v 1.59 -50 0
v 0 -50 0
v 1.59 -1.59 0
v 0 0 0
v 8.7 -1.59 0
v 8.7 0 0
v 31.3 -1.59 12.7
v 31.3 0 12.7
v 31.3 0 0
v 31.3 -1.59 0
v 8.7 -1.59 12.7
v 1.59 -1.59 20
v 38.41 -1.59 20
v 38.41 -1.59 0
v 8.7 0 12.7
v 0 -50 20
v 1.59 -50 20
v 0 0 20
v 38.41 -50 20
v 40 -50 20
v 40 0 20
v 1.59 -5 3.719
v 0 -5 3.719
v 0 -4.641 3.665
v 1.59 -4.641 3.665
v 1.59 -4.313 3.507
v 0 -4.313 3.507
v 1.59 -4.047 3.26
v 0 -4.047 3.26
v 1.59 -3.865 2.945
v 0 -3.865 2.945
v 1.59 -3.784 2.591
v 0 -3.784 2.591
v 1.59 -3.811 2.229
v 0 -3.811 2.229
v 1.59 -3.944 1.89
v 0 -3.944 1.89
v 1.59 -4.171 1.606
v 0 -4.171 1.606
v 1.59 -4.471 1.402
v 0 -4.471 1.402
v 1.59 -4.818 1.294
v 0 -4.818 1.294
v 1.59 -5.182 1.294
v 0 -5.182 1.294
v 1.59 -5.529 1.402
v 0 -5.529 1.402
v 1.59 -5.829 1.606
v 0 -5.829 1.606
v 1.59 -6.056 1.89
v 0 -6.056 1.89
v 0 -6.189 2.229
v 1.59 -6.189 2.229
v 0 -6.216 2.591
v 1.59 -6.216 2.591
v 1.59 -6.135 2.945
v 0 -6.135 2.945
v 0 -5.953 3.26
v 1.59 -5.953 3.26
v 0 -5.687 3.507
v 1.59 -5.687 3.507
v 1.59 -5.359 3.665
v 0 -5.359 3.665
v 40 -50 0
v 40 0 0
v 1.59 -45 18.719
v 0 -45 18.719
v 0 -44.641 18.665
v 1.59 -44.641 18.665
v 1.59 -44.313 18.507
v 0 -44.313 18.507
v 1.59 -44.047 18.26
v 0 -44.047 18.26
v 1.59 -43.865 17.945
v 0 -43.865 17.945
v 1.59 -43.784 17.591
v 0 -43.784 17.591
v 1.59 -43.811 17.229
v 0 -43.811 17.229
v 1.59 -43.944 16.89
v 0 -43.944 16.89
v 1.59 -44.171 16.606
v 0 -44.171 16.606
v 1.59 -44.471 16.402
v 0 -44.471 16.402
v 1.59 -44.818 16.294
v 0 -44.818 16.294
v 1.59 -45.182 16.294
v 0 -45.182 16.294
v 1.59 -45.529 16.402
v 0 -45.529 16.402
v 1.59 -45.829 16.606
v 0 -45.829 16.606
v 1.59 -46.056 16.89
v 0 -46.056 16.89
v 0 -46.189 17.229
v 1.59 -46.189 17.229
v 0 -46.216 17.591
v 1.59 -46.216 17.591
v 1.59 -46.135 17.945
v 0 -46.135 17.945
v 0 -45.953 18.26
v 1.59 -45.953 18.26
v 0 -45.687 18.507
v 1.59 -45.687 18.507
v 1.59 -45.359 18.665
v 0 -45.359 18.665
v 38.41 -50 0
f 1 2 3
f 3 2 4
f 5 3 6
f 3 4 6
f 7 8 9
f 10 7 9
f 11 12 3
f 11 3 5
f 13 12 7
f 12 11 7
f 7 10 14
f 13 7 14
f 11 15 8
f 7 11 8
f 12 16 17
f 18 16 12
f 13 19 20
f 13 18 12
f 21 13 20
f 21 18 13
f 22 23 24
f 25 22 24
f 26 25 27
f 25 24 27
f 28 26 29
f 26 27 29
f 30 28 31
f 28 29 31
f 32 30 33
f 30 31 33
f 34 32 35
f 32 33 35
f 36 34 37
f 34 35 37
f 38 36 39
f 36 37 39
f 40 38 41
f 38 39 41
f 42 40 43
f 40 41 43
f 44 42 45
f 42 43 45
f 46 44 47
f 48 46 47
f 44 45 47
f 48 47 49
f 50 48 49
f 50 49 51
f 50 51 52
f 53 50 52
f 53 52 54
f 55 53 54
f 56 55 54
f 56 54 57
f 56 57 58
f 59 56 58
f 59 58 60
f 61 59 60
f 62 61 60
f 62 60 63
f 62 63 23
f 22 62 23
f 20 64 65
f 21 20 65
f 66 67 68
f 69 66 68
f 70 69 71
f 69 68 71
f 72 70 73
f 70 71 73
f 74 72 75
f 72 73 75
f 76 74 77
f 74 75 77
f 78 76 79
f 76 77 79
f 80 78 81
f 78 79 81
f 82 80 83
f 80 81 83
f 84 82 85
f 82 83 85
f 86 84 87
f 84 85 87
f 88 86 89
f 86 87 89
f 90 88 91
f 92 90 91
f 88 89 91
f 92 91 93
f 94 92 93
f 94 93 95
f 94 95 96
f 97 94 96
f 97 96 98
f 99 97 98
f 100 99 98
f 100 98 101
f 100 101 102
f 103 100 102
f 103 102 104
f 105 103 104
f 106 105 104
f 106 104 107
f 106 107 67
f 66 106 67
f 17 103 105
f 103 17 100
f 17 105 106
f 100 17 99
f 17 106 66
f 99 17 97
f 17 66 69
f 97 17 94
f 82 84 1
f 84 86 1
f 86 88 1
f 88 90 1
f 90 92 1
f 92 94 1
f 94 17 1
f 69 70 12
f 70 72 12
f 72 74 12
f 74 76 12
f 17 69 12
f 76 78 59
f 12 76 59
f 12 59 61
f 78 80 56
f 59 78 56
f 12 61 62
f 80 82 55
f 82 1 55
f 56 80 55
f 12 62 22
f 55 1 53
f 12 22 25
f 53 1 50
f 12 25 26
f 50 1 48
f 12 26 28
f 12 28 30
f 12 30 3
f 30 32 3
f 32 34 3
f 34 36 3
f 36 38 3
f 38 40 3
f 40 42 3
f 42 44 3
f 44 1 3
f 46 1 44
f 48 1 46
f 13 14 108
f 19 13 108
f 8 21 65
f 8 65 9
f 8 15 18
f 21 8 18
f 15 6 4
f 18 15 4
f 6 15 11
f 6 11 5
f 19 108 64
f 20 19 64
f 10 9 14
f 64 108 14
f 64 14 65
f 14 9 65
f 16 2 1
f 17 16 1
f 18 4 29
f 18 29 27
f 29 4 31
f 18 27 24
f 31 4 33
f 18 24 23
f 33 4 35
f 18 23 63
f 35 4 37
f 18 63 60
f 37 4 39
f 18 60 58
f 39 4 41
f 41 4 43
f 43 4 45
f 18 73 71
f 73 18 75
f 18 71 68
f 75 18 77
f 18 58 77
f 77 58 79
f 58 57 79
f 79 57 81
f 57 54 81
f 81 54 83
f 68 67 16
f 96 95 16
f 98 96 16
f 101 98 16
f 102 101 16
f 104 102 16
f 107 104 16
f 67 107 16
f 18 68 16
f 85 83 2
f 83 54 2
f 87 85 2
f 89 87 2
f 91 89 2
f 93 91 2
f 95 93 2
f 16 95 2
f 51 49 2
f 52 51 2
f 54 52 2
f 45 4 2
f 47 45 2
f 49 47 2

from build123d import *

# Parameters (mm, degrees)
BOSS_EXTRUDE1_DEPTH        = 20
SKETCH2_W                  = 22.6
SKETCH2_H                  = 12.7
CUT_EXTRUDE1_DEPTH         = 10
F_2_CLEARANCE_HOLE1_REACH  = 69.082
F_2_CLEARANCE_HOLE1_BORE_R = 1.2192


with BuildPart() as part:
    # Sketch1 → Boss-Extrude1 (new body)
    with BuildSketch(Plane.XY):
        Polygon((1.59, -50), (1.59, -1.59), (38.41, -1.59), (38.41, -50), (40, -50), (40, 0), (0, 0), (0, -50), align=None)
    extrude(amount=BOSS_EXTRUDE1_DEPTH)

    # Sketch2 → Cut-Extrude1 (cut)
    with BuildSketch(Plane(origin=(0, 0, 0), x_dir=(1, 0, 0), z_dir=(0, 1, 0))):
        with Locations((20, -6.35)):
            Rectangle(SKETCH2_W, SKETCH2_H)
    extrude(amount=-CUT_EXTRUDE1_DEPTH, mode=Mode.SUBTRACT)

    # #2 Clearance Hole1 bore → #2 Clearance Hole1 (cut, up to next)
    with BuildSketch(Plane.ZY, mode=Mode.PRIVATE) as f_2_clearance_hole1_sk1:
        with Locations((2.5, -5)):
            Circle(F_2_CLEARANCE_HOLE1_BORE_R)
    f_2_clearance_hole1_tool1 = extrude(f_2_clearance_hole1_sk1.sketch, amount=-F_2_CLEARANCE_HOLE1_REACH, mode=Mode.PRIVATE) & part.part
    # #2 Clearance Hole1 bore → #2 Clearance Hole1 (cut, up to next)
    with BuildSketch(Plane.ZY, mode=Mode.PRIVATE) as f_2_clearance_hole1_sk2:
        with Locations((17.5, -45)):
            Circle(F_2_CLEARANCE_HOLE1_BORE_R)
    f_2_clearance_hole1_tool2 = extrude(f_2_clearance_hole1_sk2.sketch, amount=-F_2_CLEARANCE_HOLE1_REACH, mode=Mode.PRIVATE) & part.part
    add(f_2_clearance_hole1_tool1.solids().sort_by_distance((0, -5, 2.5))[0], mode=Mode.SUBTRACT)
    add(f_2_clearance_hole1_tool2.solids().sort_by_distance((0, -45, 17.5))[0], mode=Mode.SUBTRACT)


solid = part.part
